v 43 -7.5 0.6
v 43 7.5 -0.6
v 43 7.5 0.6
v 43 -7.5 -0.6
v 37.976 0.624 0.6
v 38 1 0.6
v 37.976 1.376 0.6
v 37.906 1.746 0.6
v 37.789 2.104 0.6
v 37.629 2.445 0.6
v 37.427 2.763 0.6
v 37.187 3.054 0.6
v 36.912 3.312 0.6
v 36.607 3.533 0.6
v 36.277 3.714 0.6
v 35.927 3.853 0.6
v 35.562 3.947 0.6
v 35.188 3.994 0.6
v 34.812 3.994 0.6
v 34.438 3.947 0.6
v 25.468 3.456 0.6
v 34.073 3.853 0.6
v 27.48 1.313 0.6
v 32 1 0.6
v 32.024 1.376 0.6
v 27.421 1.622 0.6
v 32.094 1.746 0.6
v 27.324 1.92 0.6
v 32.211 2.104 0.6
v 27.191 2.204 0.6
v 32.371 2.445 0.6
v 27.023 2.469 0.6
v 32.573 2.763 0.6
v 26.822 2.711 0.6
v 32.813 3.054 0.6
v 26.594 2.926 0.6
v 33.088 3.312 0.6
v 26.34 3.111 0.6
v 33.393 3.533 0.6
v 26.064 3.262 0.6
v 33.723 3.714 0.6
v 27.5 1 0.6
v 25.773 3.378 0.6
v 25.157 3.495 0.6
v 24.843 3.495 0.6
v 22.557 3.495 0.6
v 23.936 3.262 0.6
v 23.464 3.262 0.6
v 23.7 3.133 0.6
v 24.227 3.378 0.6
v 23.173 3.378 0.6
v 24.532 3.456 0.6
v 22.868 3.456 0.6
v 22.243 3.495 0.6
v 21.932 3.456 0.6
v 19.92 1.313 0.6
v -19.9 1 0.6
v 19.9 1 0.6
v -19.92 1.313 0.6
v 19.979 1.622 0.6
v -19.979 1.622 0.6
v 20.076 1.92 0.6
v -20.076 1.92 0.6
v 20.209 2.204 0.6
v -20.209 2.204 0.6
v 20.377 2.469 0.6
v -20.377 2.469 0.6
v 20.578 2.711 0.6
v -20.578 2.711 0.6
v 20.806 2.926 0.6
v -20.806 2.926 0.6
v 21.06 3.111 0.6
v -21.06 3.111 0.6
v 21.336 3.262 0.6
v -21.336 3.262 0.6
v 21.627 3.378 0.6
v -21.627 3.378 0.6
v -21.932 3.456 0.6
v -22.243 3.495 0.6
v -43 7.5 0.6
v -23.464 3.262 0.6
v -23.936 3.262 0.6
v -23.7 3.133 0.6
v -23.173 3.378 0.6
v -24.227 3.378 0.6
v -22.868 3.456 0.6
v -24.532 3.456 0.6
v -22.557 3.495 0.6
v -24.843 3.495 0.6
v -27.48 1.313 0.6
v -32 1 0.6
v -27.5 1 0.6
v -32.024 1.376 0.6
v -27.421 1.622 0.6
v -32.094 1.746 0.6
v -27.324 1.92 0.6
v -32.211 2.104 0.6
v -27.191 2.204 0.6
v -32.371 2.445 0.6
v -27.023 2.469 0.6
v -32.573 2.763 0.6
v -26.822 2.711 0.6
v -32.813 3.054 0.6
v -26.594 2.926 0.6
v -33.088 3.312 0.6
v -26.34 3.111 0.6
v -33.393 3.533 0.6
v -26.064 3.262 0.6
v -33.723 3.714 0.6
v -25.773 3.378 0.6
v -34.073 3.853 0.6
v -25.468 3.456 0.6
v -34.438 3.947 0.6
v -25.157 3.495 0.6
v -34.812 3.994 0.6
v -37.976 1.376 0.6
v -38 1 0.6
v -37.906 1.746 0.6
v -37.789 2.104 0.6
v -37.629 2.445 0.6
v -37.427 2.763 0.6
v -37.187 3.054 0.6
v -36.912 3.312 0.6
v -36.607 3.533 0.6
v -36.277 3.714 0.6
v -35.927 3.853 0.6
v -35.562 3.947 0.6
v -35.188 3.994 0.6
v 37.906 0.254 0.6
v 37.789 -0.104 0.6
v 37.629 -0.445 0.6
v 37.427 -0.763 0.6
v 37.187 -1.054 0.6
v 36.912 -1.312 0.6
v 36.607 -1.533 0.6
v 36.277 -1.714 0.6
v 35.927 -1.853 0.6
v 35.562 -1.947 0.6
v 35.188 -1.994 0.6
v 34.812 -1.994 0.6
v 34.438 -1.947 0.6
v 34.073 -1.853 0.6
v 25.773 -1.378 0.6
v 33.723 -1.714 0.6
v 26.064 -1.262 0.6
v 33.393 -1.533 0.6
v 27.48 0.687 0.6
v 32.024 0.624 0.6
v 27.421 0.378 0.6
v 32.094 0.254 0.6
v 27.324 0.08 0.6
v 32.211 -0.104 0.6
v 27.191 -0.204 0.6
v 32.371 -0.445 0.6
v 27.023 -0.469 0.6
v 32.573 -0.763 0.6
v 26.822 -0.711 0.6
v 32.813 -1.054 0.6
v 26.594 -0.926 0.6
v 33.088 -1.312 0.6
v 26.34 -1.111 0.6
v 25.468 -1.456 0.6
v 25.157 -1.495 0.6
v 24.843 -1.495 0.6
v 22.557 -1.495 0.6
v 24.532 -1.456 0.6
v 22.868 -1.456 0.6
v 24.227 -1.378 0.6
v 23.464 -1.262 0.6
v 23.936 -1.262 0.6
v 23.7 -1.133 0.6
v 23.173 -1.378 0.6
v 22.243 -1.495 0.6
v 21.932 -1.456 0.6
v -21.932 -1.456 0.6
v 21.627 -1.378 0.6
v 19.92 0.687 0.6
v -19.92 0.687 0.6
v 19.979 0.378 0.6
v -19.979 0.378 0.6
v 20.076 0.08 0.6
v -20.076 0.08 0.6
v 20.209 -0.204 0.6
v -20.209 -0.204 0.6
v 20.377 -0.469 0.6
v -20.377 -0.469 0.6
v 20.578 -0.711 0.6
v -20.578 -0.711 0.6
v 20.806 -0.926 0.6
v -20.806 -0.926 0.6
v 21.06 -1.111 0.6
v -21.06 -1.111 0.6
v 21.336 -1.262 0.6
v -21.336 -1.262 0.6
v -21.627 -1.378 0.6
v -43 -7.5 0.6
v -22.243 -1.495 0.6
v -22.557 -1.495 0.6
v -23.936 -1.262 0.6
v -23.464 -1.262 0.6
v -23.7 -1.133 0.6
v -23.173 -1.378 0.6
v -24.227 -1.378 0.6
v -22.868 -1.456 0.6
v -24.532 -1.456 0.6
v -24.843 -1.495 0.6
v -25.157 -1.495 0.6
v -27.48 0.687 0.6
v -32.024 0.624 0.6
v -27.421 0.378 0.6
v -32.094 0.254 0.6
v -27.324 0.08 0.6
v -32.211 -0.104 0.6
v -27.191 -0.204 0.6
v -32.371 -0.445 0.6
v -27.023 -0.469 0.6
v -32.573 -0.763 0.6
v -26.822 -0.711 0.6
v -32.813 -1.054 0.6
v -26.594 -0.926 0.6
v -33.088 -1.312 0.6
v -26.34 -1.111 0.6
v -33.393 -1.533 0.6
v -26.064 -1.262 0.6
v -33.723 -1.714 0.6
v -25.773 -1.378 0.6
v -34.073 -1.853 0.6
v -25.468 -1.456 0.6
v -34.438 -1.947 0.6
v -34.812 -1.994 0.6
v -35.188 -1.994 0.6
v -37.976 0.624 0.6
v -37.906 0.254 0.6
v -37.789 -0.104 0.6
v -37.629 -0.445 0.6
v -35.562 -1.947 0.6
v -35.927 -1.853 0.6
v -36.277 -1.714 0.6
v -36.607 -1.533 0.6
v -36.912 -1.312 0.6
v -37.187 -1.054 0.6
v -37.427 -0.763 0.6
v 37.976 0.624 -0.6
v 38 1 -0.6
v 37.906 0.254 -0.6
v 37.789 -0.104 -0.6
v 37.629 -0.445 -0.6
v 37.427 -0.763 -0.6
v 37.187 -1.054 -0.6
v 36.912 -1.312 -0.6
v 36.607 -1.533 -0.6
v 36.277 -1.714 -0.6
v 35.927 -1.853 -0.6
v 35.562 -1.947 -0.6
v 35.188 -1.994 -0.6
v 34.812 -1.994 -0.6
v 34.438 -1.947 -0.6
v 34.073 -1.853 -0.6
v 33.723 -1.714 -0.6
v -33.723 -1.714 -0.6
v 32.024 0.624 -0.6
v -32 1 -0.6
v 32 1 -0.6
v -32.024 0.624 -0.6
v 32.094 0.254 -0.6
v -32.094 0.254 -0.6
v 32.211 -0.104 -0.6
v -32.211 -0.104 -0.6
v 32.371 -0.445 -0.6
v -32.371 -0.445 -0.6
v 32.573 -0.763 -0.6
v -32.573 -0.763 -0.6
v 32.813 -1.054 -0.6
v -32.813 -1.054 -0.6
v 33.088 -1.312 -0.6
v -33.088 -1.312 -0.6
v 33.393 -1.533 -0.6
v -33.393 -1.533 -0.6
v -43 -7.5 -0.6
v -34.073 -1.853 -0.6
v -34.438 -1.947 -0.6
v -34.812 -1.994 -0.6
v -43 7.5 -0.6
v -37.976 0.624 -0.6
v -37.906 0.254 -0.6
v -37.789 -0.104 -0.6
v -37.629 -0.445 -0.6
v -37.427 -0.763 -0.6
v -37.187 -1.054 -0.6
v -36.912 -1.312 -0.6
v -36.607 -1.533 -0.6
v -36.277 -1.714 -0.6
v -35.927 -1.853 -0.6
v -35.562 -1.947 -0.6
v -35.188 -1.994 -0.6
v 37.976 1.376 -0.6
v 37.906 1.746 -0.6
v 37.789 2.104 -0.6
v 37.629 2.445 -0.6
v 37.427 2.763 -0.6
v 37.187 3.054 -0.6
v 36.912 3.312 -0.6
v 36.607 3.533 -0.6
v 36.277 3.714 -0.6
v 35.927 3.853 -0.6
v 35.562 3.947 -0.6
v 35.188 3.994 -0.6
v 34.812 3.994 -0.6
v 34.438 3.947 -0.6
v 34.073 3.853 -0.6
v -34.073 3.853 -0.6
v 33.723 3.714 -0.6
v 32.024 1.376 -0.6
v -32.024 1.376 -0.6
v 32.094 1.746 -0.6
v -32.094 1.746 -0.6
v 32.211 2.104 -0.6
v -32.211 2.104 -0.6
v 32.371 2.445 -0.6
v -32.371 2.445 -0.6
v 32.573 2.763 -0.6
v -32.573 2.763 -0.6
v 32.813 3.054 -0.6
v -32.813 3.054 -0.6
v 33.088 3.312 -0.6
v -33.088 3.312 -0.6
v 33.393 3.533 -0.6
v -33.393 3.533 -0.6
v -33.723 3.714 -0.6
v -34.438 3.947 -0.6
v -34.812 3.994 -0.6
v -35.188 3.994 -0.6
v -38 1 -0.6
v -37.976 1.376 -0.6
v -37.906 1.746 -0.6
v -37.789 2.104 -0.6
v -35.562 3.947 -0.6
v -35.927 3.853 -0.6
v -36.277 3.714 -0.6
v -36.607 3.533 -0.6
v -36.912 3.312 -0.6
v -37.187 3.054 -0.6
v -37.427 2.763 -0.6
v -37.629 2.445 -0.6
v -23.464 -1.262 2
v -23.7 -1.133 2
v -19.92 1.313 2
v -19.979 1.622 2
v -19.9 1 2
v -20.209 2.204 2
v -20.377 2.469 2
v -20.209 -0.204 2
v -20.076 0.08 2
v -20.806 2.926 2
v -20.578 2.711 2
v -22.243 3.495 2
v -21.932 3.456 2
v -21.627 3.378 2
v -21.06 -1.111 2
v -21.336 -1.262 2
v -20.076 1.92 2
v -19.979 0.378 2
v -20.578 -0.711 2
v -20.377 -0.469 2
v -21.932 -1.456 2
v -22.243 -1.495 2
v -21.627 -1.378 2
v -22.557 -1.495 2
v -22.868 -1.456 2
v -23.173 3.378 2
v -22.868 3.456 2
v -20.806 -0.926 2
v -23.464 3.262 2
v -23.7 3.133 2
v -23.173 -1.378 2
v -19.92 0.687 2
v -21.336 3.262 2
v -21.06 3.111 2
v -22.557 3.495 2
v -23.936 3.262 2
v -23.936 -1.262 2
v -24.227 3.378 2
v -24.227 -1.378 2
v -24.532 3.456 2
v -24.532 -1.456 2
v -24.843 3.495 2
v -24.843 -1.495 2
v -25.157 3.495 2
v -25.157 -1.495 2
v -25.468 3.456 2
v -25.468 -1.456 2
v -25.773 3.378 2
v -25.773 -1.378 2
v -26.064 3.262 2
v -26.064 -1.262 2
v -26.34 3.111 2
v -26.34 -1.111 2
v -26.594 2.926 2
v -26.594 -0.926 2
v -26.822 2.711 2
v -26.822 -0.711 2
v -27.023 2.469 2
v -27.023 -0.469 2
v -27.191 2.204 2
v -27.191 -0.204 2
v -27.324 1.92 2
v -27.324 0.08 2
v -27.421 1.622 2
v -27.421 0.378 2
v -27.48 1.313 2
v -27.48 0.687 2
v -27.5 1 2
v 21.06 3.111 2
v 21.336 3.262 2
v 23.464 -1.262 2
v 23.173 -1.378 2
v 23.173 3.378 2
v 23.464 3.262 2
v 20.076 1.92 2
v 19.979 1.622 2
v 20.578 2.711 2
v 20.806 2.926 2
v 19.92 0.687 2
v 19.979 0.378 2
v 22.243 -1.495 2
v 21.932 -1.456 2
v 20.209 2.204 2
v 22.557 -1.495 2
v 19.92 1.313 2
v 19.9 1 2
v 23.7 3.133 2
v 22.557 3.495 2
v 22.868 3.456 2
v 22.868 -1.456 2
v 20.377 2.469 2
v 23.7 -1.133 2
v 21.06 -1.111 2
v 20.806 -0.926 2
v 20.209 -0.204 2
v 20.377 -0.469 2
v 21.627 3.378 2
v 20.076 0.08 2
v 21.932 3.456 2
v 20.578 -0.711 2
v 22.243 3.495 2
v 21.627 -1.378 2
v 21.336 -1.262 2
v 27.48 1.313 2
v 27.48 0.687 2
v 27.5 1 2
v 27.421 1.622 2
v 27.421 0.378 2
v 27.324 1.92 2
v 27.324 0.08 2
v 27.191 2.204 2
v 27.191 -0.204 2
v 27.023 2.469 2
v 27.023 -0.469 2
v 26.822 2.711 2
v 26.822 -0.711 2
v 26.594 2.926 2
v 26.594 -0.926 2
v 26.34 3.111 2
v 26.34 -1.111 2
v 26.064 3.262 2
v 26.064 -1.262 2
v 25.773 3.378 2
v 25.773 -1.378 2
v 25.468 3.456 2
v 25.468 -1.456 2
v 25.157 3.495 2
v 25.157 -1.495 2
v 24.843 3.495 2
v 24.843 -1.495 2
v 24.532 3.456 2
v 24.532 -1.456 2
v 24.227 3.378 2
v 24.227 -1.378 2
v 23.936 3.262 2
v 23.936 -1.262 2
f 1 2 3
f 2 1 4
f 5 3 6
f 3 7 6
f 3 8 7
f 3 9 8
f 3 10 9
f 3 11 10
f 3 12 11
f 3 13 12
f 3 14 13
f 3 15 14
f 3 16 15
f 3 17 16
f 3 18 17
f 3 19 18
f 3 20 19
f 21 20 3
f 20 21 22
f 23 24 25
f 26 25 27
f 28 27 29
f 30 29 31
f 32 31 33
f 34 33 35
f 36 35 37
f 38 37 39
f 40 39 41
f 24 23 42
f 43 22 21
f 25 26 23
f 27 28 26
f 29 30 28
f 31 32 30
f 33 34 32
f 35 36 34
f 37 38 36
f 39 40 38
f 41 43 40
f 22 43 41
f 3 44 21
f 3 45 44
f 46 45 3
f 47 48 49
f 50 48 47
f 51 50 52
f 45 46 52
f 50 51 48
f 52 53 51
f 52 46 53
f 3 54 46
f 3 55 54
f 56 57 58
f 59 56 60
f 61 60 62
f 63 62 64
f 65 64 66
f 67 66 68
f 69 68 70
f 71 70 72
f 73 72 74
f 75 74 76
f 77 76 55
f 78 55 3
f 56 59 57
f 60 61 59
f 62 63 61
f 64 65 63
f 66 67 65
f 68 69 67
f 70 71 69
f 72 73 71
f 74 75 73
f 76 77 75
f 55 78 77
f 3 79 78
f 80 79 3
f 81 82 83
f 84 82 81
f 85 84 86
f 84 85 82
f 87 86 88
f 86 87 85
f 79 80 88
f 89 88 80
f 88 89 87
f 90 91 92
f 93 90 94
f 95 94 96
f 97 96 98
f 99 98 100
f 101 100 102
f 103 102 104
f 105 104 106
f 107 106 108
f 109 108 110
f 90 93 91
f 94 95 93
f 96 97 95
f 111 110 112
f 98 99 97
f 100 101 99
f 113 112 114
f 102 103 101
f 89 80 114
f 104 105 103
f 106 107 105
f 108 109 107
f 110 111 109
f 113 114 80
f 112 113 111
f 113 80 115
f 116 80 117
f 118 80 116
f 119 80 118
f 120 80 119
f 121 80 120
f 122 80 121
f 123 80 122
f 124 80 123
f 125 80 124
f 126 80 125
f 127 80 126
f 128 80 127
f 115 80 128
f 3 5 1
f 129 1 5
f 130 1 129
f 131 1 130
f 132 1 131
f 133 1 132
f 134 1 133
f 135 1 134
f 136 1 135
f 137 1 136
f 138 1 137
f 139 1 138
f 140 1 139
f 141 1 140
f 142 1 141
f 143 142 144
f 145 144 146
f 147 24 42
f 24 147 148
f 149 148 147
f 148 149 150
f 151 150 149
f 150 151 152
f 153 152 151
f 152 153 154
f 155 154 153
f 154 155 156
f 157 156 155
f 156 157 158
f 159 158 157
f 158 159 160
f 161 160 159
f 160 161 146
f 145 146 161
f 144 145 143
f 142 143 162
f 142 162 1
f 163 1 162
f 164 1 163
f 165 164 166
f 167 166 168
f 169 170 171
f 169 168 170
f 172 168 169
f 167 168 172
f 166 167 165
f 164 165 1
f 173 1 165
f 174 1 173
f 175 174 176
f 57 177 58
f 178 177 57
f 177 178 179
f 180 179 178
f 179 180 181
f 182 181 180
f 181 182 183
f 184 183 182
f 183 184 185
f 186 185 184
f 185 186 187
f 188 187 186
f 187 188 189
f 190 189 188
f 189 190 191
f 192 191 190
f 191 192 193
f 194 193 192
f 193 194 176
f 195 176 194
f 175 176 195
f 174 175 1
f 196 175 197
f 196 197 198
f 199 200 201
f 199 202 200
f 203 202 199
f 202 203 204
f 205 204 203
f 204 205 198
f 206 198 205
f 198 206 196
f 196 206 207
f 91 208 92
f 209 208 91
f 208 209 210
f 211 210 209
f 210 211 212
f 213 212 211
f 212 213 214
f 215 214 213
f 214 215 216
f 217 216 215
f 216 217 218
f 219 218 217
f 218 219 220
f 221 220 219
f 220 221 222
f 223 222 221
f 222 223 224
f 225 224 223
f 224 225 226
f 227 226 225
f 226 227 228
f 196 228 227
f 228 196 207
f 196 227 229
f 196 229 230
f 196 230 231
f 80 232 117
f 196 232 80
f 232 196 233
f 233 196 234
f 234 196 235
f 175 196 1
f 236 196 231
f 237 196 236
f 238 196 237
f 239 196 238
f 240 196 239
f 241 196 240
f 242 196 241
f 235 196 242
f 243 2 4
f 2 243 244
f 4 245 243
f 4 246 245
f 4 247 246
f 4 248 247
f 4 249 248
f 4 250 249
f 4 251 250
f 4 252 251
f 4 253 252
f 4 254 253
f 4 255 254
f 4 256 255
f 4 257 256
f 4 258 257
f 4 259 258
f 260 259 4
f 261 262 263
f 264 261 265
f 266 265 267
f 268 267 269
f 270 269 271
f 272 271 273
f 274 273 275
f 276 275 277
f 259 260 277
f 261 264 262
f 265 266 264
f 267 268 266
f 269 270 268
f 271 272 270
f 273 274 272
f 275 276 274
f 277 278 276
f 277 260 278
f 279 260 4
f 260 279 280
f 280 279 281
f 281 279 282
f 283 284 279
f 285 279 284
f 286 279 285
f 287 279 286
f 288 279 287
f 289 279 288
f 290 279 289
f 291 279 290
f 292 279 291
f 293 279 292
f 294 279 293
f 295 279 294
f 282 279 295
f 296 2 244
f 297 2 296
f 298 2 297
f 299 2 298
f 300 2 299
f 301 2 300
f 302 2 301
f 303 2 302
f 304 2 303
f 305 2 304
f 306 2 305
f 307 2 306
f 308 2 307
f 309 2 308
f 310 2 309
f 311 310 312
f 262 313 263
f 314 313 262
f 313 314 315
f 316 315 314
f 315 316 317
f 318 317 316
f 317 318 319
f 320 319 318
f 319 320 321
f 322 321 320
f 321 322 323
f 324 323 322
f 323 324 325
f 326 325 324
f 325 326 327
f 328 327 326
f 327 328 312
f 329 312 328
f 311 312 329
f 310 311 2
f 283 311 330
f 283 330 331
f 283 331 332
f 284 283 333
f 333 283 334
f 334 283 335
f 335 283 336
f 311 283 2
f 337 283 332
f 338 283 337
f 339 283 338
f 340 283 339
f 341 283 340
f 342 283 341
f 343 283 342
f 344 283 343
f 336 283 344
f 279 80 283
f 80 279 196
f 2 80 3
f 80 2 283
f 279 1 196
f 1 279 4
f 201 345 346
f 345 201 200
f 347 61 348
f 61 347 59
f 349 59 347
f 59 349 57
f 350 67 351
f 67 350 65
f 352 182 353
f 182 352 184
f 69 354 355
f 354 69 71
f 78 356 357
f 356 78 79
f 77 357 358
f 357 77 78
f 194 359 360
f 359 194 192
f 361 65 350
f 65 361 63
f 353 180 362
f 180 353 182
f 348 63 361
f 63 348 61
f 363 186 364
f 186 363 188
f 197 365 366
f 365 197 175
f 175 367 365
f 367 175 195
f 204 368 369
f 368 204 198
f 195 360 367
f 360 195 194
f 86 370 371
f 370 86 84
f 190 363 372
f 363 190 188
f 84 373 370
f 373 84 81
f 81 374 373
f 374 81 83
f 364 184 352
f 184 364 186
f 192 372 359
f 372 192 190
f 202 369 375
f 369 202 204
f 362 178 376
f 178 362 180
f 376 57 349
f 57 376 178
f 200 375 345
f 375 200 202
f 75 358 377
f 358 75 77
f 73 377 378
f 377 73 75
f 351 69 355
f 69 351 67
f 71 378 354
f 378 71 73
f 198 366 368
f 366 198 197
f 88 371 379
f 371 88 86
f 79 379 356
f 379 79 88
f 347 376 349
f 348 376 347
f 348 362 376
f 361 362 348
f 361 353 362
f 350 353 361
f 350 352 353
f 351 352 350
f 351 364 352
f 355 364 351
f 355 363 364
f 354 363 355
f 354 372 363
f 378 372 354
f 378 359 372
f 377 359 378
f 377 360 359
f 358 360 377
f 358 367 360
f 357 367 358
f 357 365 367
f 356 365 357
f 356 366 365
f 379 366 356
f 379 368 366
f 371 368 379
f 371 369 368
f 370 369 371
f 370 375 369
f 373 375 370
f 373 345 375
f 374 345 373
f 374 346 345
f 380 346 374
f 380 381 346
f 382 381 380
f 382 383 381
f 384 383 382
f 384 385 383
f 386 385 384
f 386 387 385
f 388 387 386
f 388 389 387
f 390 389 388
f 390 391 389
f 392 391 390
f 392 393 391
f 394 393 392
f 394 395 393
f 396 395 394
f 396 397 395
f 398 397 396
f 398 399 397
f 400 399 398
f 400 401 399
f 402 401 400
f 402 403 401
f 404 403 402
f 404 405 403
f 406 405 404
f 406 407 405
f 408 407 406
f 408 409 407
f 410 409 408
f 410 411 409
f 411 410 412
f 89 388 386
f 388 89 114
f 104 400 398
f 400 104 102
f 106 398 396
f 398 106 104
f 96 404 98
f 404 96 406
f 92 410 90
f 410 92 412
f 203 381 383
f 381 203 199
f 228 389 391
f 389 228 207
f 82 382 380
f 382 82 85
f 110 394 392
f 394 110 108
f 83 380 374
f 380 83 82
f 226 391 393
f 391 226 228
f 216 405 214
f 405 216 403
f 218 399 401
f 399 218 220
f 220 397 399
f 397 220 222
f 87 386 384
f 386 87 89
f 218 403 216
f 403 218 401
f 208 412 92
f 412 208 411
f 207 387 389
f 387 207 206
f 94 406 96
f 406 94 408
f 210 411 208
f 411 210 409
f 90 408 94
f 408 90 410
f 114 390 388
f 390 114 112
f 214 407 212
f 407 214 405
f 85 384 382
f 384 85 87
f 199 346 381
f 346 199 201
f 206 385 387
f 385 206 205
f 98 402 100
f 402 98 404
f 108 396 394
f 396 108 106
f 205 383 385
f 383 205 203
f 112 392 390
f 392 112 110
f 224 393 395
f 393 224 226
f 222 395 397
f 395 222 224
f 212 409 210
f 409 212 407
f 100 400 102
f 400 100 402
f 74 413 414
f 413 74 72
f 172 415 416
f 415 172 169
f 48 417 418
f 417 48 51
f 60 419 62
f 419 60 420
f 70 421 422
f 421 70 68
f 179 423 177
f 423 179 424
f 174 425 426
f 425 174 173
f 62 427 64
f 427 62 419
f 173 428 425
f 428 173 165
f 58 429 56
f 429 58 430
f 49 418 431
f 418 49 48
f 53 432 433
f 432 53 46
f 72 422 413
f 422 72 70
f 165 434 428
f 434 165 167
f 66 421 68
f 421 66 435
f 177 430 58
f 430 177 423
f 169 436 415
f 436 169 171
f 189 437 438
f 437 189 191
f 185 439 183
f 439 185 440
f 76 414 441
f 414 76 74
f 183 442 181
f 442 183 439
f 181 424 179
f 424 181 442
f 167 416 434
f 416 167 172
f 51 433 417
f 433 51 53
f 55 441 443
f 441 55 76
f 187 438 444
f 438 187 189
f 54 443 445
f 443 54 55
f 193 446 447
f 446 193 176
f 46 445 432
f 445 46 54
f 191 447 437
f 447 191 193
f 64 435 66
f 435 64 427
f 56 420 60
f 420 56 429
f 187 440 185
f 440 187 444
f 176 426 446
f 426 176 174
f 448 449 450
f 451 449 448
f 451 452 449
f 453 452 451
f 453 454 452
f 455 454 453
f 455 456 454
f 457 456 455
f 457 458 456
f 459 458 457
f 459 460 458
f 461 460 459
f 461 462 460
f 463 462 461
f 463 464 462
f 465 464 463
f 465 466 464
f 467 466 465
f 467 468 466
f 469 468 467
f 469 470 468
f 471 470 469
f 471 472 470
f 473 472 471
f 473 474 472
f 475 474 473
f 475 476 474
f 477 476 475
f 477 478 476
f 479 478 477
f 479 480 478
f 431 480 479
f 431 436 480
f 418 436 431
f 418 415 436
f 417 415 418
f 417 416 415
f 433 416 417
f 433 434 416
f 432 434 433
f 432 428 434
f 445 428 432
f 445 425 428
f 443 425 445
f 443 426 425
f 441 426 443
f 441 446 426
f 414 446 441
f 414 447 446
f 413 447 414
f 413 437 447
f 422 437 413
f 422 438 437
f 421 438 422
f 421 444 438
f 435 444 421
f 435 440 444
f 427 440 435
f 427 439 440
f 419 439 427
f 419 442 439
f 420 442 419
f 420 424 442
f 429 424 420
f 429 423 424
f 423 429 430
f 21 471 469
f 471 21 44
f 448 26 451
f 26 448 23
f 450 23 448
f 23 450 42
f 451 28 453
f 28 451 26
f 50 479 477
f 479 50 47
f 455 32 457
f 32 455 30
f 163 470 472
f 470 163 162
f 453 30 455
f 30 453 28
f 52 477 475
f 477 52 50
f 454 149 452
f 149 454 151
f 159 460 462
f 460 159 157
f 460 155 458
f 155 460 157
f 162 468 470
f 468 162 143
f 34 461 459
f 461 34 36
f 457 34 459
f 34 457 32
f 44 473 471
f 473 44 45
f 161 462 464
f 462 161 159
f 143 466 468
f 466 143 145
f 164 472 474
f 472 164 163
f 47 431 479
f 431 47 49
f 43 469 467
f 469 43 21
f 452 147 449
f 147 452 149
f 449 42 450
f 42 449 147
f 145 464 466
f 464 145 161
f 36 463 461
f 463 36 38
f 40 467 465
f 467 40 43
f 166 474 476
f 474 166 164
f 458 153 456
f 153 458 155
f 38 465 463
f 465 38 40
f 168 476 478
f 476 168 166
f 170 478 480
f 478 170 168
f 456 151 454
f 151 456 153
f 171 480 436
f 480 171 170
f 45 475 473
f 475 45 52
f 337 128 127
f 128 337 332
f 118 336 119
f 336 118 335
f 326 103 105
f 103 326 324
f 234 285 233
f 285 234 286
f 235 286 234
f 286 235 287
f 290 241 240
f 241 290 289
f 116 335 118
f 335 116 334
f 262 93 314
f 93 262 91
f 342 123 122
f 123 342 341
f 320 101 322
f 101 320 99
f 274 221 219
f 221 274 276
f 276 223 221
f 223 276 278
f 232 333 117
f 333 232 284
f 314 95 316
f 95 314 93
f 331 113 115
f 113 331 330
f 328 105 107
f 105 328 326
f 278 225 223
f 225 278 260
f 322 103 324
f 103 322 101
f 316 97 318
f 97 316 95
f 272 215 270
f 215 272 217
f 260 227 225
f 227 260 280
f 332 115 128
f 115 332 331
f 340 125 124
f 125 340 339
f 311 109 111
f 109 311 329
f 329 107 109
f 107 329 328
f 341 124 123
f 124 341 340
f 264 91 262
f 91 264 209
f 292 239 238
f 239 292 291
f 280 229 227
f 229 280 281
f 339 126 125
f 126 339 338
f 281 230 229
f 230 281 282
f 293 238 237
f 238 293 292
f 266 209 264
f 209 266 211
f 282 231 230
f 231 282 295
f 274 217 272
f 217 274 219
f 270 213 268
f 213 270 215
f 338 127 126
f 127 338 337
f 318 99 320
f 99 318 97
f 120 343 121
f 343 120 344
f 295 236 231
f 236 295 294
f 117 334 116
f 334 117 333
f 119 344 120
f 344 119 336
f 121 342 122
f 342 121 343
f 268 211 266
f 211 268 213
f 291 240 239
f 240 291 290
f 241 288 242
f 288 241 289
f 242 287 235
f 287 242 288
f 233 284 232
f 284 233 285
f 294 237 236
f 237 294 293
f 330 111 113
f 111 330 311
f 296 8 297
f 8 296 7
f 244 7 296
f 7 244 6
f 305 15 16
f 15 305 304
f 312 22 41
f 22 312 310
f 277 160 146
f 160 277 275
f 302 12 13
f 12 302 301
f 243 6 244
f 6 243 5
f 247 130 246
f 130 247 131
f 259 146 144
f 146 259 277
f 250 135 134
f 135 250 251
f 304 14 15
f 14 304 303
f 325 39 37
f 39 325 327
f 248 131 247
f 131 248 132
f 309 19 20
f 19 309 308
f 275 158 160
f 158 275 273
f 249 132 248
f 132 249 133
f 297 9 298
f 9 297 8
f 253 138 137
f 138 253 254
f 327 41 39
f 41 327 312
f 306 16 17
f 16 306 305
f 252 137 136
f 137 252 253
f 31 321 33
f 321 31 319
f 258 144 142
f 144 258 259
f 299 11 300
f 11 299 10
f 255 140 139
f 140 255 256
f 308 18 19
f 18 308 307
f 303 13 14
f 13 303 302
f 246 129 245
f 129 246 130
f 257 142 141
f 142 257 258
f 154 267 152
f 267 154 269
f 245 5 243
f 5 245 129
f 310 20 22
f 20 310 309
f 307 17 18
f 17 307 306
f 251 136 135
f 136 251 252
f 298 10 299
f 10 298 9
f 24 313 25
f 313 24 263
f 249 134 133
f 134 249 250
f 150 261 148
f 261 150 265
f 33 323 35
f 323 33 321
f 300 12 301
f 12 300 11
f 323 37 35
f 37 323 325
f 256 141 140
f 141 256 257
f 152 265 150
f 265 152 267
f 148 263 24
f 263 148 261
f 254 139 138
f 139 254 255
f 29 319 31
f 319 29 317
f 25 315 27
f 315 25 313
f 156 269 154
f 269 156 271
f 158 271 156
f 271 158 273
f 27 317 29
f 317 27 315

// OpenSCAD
// d rurub = 5 mm
// d teava = 10mm
// x1 = 70mm
// x2 = 40mm + 10


difference() {

    union(){
        cube([86,15,1.2], center=true);
        translate([-22.4,1,0])
            cylinder(d=5,h=2, $fn=50);
        translate([-25,1, 0])
            cylinder(d=5,h=2, $fn=50);
        translate([22.4,1,0])
            cylinder(d=5,h=2, $fn=50);
        translate([25,1, 0])
            cylinder(d=5,h=2, $fn=50);
    }

    translate([-35,1,-1])
        cylinder(d=6,h=5, $fn=50);

    translate([35,1,-1])
        cylinder(d=6,h=5, $fn=50);
}

//color("red")
//translate([0,0,1])
//cube([39.5,15,1], center=true);
